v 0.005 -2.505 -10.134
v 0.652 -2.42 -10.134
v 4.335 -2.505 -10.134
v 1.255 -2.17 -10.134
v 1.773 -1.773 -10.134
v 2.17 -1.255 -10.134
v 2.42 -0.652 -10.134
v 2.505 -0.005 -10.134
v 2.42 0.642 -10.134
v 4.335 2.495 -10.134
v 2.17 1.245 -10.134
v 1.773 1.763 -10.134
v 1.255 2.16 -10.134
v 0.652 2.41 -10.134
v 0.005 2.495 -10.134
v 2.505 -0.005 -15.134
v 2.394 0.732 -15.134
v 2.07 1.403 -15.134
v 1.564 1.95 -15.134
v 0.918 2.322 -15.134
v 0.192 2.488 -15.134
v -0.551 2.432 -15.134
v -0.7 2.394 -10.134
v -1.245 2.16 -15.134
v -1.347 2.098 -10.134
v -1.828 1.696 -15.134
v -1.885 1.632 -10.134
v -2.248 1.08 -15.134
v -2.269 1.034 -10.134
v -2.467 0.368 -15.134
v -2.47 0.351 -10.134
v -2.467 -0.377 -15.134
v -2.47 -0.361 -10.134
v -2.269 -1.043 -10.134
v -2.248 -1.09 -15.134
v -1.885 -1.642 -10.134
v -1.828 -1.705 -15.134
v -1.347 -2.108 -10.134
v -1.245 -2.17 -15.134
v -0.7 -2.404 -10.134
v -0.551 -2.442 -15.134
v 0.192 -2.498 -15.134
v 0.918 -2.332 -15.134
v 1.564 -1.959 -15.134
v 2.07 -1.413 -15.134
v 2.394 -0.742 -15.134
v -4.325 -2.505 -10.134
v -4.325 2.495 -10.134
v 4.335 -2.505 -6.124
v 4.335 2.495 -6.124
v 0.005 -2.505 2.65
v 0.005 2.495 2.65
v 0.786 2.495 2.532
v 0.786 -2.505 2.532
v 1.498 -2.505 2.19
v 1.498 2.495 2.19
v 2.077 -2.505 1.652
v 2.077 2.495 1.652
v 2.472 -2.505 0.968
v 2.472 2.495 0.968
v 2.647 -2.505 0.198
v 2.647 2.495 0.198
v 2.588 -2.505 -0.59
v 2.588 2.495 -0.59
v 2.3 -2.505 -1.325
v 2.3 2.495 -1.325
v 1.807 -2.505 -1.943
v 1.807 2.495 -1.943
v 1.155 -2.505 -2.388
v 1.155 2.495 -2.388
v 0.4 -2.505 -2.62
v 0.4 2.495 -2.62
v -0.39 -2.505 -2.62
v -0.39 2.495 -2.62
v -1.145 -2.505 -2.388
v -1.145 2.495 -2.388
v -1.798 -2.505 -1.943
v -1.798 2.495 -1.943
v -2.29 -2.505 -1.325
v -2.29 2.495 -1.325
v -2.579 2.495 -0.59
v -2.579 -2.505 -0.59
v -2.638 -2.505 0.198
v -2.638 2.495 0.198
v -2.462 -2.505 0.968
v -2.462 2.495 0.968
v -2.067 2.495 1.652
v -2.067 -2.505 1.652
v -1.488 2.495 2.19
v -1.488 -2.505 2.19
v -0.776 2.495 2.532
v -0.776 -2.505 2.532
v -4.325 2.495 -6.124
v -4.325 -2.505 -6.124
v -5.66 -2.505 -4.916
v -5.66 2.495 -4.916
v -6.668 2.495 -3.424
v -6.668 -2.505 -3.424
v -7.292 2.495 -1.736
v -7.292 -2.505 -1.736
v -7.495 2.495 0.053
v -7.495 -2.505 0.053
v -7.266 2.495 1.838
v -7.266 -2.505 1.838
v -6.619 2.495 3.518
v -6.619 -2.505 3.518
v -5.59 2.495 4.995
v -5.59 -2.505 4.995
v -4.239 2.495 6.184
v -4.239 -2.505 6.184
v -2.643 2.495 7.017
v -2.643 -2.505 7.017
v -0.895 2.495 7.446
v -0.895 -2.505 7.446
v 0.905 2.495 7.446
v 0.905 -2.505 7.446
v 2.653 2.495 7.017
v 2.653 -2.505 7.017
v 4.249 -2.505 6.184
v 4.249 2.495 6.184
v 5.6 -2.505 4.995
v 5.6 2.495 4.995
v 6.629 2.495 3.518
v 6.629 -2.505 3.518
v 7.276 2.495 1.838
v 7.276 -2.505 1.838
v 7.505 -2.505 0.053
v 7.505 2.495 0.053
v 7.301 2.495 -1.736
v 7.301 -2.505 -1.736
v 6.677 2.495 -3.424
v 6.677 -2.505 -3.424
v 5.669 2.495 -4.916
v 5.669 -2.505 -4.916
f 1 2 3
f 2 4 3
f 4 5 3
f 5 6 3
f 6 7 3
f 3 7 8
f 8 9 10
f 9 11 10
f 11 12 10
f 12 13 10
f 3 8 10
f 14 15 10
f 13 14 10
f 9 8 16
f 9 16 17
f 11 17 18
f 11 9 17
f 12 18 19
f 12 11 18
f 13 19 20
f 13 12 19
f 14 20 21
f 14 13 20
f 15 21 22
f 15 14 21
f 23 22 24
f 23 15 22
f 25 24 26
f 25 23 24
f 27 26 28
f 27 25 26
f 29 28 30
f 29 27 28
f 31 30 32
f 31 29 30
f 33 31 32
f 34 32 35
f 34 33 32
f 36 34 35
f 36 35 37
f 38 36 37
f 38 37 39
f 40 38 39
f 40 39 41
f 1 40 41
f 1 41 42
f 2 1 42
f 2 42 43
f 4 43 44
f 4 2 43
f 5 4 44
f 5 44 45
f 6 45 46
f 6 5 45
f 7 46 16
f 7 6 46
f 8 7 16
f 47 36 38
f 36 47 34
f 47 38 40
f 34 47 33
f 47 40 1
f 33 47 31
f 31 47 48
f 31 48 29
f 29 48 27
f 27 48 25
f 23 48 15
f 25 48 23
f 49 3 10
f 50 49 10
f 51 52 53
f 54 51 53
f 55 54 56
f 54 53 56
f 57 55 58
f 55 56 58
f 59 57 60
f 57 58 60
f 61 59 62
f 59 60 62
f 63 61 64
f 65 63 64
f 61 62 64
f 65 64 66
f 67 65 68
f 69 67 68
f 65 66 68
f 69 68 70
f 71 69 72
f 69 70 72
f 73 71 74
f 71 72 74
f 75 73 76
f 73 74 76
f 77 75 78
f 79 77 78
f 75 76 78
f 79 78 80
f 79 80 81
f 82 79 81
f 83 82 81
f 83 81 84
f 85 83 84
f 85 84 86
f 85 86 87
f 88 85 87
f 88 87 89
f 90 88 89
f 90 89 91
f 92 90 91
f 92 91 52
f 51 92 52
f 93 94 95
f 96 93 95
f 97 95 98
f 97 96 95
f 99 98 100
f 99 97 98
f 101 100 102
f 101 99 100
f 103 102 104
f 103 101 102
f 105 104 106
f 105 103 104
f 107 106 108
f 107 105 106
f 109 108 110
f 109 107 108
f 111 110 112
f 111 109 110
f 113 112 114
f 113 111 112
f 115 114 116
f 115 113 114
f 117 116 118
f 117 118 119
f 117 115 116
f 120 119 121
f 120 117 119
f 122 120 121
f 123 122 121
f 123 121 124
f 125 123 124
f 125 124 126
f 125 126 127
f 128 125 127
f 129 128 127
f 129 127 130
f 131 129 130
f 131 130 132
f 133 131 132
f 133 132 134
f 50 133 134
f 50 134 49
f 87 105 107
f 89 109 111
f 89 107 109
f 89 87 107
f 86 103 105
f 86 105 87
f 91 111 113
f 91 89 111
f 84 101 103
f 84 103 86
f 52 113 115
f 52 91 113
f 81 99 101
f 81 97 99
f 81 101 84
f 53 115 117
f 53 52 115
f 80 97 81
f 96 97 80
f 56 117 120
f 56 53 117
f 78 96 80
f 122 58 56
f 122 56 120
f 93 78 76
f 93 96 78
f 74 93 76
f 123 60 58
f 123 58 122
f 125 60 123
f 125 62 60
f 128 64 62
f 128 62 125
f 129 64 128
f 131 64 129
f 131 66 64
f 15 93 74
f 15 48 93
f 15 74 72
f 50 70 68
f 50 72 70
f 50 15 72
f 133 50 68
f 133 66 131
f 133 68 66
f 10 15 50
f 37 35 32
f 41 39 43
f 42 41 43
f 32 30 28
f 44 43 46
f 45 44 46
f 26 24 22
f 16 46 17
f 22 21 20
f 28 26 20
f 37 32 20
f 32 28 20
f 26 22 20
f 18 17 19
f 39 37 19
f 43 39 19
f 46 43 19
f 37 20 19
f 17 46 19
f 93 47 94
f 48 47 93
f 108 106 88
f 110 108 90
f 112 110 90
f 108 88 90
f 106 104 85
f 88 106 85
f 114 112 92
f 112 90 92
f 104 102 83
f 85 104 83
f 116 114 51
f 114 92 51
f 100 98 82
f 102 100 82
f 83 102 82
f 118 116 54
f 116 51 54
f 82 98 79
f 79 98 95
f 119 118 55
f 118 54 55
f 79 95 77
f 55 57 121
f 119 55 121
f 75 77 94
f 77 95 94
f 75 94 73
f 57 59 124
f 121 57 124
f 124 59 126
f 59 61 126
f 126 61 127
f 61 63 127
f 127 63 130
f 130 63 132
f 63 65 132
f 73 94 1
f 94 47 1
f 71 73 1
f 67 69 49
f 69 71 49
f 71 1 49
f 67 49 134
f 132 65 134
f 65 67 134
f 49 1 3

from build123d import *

# Parameters (mm, degrees)
SKETCH1_R           = 2.5
BOSS_EXTRUDE1_DEPTH = 5
SKETCH2_W           = 8.660254038
SKETCH2_H           = 5
BOSS_EXTRUDE2_DEPTH = 11
SKETCH3_R           = 7.5
BOSS_EXTRUDE3_DEPTH = 5
SKETCH4_R           = 2.65
CUT_EXTRUDE1_DEPTH  = 36.309767636


with BuildPart() as part:
    # Sketch1 → Boss-Extrude1 (new body)
    with BuildSketch(Plane.XY.offset(2.596184677)):
        with Locations((21.004809472, 129.315154096)):
            Circle(SKETCH1_R)
    extrude(amount=-BOSS_EXTRUDE1_DEPTH)

    # Sketch2 → Boss-Extrude2 (add)
    with BuildSketch(Plane.XY.offset(2.596184677)):
        with Locations((21.004809472, 129.315154096)):
            Rectangle(SKETCH2_W, SKETCH2_H)
    extrude(amount=BOSS_EXTRUDE2_DEPTH)

    # Sketch3 → Boss-Extrude3 (add)
    with BuildSketch(Plane(origin=(0, 131.815154096, 0), x_dir=(1, 0, 0), z_dir=(0, 1, 0))):
        with Locations((21.004809472, -12.730064941)):
            Circle(SKETCH3_R)
    extrude(amount=-BOSS_EXTRUDE3_DEPTH)

    # Sketch4 → Cut-Extrude1 (cut, through all)
    with BuildSketch(Plane(origin=(0, 131.815154096, 0), x_dir=(1, 0, 0), z_dir=(0, 1, 0))):
        with Locations(Location((21.004809472, -12.730064941, 0), (0, 0, 270))):
            Circle(SKETCH4_R)
    extrude(amount=-CUT_EXTRUDE1_DEPTH, mode=Mode.SUBTRACT)


with BuildPart() as part_1:
    # Body-Move/Copy1: moved
    add(part.part.moved(Location((-21, -129.32, -12.73))))


solid = part_1.part
